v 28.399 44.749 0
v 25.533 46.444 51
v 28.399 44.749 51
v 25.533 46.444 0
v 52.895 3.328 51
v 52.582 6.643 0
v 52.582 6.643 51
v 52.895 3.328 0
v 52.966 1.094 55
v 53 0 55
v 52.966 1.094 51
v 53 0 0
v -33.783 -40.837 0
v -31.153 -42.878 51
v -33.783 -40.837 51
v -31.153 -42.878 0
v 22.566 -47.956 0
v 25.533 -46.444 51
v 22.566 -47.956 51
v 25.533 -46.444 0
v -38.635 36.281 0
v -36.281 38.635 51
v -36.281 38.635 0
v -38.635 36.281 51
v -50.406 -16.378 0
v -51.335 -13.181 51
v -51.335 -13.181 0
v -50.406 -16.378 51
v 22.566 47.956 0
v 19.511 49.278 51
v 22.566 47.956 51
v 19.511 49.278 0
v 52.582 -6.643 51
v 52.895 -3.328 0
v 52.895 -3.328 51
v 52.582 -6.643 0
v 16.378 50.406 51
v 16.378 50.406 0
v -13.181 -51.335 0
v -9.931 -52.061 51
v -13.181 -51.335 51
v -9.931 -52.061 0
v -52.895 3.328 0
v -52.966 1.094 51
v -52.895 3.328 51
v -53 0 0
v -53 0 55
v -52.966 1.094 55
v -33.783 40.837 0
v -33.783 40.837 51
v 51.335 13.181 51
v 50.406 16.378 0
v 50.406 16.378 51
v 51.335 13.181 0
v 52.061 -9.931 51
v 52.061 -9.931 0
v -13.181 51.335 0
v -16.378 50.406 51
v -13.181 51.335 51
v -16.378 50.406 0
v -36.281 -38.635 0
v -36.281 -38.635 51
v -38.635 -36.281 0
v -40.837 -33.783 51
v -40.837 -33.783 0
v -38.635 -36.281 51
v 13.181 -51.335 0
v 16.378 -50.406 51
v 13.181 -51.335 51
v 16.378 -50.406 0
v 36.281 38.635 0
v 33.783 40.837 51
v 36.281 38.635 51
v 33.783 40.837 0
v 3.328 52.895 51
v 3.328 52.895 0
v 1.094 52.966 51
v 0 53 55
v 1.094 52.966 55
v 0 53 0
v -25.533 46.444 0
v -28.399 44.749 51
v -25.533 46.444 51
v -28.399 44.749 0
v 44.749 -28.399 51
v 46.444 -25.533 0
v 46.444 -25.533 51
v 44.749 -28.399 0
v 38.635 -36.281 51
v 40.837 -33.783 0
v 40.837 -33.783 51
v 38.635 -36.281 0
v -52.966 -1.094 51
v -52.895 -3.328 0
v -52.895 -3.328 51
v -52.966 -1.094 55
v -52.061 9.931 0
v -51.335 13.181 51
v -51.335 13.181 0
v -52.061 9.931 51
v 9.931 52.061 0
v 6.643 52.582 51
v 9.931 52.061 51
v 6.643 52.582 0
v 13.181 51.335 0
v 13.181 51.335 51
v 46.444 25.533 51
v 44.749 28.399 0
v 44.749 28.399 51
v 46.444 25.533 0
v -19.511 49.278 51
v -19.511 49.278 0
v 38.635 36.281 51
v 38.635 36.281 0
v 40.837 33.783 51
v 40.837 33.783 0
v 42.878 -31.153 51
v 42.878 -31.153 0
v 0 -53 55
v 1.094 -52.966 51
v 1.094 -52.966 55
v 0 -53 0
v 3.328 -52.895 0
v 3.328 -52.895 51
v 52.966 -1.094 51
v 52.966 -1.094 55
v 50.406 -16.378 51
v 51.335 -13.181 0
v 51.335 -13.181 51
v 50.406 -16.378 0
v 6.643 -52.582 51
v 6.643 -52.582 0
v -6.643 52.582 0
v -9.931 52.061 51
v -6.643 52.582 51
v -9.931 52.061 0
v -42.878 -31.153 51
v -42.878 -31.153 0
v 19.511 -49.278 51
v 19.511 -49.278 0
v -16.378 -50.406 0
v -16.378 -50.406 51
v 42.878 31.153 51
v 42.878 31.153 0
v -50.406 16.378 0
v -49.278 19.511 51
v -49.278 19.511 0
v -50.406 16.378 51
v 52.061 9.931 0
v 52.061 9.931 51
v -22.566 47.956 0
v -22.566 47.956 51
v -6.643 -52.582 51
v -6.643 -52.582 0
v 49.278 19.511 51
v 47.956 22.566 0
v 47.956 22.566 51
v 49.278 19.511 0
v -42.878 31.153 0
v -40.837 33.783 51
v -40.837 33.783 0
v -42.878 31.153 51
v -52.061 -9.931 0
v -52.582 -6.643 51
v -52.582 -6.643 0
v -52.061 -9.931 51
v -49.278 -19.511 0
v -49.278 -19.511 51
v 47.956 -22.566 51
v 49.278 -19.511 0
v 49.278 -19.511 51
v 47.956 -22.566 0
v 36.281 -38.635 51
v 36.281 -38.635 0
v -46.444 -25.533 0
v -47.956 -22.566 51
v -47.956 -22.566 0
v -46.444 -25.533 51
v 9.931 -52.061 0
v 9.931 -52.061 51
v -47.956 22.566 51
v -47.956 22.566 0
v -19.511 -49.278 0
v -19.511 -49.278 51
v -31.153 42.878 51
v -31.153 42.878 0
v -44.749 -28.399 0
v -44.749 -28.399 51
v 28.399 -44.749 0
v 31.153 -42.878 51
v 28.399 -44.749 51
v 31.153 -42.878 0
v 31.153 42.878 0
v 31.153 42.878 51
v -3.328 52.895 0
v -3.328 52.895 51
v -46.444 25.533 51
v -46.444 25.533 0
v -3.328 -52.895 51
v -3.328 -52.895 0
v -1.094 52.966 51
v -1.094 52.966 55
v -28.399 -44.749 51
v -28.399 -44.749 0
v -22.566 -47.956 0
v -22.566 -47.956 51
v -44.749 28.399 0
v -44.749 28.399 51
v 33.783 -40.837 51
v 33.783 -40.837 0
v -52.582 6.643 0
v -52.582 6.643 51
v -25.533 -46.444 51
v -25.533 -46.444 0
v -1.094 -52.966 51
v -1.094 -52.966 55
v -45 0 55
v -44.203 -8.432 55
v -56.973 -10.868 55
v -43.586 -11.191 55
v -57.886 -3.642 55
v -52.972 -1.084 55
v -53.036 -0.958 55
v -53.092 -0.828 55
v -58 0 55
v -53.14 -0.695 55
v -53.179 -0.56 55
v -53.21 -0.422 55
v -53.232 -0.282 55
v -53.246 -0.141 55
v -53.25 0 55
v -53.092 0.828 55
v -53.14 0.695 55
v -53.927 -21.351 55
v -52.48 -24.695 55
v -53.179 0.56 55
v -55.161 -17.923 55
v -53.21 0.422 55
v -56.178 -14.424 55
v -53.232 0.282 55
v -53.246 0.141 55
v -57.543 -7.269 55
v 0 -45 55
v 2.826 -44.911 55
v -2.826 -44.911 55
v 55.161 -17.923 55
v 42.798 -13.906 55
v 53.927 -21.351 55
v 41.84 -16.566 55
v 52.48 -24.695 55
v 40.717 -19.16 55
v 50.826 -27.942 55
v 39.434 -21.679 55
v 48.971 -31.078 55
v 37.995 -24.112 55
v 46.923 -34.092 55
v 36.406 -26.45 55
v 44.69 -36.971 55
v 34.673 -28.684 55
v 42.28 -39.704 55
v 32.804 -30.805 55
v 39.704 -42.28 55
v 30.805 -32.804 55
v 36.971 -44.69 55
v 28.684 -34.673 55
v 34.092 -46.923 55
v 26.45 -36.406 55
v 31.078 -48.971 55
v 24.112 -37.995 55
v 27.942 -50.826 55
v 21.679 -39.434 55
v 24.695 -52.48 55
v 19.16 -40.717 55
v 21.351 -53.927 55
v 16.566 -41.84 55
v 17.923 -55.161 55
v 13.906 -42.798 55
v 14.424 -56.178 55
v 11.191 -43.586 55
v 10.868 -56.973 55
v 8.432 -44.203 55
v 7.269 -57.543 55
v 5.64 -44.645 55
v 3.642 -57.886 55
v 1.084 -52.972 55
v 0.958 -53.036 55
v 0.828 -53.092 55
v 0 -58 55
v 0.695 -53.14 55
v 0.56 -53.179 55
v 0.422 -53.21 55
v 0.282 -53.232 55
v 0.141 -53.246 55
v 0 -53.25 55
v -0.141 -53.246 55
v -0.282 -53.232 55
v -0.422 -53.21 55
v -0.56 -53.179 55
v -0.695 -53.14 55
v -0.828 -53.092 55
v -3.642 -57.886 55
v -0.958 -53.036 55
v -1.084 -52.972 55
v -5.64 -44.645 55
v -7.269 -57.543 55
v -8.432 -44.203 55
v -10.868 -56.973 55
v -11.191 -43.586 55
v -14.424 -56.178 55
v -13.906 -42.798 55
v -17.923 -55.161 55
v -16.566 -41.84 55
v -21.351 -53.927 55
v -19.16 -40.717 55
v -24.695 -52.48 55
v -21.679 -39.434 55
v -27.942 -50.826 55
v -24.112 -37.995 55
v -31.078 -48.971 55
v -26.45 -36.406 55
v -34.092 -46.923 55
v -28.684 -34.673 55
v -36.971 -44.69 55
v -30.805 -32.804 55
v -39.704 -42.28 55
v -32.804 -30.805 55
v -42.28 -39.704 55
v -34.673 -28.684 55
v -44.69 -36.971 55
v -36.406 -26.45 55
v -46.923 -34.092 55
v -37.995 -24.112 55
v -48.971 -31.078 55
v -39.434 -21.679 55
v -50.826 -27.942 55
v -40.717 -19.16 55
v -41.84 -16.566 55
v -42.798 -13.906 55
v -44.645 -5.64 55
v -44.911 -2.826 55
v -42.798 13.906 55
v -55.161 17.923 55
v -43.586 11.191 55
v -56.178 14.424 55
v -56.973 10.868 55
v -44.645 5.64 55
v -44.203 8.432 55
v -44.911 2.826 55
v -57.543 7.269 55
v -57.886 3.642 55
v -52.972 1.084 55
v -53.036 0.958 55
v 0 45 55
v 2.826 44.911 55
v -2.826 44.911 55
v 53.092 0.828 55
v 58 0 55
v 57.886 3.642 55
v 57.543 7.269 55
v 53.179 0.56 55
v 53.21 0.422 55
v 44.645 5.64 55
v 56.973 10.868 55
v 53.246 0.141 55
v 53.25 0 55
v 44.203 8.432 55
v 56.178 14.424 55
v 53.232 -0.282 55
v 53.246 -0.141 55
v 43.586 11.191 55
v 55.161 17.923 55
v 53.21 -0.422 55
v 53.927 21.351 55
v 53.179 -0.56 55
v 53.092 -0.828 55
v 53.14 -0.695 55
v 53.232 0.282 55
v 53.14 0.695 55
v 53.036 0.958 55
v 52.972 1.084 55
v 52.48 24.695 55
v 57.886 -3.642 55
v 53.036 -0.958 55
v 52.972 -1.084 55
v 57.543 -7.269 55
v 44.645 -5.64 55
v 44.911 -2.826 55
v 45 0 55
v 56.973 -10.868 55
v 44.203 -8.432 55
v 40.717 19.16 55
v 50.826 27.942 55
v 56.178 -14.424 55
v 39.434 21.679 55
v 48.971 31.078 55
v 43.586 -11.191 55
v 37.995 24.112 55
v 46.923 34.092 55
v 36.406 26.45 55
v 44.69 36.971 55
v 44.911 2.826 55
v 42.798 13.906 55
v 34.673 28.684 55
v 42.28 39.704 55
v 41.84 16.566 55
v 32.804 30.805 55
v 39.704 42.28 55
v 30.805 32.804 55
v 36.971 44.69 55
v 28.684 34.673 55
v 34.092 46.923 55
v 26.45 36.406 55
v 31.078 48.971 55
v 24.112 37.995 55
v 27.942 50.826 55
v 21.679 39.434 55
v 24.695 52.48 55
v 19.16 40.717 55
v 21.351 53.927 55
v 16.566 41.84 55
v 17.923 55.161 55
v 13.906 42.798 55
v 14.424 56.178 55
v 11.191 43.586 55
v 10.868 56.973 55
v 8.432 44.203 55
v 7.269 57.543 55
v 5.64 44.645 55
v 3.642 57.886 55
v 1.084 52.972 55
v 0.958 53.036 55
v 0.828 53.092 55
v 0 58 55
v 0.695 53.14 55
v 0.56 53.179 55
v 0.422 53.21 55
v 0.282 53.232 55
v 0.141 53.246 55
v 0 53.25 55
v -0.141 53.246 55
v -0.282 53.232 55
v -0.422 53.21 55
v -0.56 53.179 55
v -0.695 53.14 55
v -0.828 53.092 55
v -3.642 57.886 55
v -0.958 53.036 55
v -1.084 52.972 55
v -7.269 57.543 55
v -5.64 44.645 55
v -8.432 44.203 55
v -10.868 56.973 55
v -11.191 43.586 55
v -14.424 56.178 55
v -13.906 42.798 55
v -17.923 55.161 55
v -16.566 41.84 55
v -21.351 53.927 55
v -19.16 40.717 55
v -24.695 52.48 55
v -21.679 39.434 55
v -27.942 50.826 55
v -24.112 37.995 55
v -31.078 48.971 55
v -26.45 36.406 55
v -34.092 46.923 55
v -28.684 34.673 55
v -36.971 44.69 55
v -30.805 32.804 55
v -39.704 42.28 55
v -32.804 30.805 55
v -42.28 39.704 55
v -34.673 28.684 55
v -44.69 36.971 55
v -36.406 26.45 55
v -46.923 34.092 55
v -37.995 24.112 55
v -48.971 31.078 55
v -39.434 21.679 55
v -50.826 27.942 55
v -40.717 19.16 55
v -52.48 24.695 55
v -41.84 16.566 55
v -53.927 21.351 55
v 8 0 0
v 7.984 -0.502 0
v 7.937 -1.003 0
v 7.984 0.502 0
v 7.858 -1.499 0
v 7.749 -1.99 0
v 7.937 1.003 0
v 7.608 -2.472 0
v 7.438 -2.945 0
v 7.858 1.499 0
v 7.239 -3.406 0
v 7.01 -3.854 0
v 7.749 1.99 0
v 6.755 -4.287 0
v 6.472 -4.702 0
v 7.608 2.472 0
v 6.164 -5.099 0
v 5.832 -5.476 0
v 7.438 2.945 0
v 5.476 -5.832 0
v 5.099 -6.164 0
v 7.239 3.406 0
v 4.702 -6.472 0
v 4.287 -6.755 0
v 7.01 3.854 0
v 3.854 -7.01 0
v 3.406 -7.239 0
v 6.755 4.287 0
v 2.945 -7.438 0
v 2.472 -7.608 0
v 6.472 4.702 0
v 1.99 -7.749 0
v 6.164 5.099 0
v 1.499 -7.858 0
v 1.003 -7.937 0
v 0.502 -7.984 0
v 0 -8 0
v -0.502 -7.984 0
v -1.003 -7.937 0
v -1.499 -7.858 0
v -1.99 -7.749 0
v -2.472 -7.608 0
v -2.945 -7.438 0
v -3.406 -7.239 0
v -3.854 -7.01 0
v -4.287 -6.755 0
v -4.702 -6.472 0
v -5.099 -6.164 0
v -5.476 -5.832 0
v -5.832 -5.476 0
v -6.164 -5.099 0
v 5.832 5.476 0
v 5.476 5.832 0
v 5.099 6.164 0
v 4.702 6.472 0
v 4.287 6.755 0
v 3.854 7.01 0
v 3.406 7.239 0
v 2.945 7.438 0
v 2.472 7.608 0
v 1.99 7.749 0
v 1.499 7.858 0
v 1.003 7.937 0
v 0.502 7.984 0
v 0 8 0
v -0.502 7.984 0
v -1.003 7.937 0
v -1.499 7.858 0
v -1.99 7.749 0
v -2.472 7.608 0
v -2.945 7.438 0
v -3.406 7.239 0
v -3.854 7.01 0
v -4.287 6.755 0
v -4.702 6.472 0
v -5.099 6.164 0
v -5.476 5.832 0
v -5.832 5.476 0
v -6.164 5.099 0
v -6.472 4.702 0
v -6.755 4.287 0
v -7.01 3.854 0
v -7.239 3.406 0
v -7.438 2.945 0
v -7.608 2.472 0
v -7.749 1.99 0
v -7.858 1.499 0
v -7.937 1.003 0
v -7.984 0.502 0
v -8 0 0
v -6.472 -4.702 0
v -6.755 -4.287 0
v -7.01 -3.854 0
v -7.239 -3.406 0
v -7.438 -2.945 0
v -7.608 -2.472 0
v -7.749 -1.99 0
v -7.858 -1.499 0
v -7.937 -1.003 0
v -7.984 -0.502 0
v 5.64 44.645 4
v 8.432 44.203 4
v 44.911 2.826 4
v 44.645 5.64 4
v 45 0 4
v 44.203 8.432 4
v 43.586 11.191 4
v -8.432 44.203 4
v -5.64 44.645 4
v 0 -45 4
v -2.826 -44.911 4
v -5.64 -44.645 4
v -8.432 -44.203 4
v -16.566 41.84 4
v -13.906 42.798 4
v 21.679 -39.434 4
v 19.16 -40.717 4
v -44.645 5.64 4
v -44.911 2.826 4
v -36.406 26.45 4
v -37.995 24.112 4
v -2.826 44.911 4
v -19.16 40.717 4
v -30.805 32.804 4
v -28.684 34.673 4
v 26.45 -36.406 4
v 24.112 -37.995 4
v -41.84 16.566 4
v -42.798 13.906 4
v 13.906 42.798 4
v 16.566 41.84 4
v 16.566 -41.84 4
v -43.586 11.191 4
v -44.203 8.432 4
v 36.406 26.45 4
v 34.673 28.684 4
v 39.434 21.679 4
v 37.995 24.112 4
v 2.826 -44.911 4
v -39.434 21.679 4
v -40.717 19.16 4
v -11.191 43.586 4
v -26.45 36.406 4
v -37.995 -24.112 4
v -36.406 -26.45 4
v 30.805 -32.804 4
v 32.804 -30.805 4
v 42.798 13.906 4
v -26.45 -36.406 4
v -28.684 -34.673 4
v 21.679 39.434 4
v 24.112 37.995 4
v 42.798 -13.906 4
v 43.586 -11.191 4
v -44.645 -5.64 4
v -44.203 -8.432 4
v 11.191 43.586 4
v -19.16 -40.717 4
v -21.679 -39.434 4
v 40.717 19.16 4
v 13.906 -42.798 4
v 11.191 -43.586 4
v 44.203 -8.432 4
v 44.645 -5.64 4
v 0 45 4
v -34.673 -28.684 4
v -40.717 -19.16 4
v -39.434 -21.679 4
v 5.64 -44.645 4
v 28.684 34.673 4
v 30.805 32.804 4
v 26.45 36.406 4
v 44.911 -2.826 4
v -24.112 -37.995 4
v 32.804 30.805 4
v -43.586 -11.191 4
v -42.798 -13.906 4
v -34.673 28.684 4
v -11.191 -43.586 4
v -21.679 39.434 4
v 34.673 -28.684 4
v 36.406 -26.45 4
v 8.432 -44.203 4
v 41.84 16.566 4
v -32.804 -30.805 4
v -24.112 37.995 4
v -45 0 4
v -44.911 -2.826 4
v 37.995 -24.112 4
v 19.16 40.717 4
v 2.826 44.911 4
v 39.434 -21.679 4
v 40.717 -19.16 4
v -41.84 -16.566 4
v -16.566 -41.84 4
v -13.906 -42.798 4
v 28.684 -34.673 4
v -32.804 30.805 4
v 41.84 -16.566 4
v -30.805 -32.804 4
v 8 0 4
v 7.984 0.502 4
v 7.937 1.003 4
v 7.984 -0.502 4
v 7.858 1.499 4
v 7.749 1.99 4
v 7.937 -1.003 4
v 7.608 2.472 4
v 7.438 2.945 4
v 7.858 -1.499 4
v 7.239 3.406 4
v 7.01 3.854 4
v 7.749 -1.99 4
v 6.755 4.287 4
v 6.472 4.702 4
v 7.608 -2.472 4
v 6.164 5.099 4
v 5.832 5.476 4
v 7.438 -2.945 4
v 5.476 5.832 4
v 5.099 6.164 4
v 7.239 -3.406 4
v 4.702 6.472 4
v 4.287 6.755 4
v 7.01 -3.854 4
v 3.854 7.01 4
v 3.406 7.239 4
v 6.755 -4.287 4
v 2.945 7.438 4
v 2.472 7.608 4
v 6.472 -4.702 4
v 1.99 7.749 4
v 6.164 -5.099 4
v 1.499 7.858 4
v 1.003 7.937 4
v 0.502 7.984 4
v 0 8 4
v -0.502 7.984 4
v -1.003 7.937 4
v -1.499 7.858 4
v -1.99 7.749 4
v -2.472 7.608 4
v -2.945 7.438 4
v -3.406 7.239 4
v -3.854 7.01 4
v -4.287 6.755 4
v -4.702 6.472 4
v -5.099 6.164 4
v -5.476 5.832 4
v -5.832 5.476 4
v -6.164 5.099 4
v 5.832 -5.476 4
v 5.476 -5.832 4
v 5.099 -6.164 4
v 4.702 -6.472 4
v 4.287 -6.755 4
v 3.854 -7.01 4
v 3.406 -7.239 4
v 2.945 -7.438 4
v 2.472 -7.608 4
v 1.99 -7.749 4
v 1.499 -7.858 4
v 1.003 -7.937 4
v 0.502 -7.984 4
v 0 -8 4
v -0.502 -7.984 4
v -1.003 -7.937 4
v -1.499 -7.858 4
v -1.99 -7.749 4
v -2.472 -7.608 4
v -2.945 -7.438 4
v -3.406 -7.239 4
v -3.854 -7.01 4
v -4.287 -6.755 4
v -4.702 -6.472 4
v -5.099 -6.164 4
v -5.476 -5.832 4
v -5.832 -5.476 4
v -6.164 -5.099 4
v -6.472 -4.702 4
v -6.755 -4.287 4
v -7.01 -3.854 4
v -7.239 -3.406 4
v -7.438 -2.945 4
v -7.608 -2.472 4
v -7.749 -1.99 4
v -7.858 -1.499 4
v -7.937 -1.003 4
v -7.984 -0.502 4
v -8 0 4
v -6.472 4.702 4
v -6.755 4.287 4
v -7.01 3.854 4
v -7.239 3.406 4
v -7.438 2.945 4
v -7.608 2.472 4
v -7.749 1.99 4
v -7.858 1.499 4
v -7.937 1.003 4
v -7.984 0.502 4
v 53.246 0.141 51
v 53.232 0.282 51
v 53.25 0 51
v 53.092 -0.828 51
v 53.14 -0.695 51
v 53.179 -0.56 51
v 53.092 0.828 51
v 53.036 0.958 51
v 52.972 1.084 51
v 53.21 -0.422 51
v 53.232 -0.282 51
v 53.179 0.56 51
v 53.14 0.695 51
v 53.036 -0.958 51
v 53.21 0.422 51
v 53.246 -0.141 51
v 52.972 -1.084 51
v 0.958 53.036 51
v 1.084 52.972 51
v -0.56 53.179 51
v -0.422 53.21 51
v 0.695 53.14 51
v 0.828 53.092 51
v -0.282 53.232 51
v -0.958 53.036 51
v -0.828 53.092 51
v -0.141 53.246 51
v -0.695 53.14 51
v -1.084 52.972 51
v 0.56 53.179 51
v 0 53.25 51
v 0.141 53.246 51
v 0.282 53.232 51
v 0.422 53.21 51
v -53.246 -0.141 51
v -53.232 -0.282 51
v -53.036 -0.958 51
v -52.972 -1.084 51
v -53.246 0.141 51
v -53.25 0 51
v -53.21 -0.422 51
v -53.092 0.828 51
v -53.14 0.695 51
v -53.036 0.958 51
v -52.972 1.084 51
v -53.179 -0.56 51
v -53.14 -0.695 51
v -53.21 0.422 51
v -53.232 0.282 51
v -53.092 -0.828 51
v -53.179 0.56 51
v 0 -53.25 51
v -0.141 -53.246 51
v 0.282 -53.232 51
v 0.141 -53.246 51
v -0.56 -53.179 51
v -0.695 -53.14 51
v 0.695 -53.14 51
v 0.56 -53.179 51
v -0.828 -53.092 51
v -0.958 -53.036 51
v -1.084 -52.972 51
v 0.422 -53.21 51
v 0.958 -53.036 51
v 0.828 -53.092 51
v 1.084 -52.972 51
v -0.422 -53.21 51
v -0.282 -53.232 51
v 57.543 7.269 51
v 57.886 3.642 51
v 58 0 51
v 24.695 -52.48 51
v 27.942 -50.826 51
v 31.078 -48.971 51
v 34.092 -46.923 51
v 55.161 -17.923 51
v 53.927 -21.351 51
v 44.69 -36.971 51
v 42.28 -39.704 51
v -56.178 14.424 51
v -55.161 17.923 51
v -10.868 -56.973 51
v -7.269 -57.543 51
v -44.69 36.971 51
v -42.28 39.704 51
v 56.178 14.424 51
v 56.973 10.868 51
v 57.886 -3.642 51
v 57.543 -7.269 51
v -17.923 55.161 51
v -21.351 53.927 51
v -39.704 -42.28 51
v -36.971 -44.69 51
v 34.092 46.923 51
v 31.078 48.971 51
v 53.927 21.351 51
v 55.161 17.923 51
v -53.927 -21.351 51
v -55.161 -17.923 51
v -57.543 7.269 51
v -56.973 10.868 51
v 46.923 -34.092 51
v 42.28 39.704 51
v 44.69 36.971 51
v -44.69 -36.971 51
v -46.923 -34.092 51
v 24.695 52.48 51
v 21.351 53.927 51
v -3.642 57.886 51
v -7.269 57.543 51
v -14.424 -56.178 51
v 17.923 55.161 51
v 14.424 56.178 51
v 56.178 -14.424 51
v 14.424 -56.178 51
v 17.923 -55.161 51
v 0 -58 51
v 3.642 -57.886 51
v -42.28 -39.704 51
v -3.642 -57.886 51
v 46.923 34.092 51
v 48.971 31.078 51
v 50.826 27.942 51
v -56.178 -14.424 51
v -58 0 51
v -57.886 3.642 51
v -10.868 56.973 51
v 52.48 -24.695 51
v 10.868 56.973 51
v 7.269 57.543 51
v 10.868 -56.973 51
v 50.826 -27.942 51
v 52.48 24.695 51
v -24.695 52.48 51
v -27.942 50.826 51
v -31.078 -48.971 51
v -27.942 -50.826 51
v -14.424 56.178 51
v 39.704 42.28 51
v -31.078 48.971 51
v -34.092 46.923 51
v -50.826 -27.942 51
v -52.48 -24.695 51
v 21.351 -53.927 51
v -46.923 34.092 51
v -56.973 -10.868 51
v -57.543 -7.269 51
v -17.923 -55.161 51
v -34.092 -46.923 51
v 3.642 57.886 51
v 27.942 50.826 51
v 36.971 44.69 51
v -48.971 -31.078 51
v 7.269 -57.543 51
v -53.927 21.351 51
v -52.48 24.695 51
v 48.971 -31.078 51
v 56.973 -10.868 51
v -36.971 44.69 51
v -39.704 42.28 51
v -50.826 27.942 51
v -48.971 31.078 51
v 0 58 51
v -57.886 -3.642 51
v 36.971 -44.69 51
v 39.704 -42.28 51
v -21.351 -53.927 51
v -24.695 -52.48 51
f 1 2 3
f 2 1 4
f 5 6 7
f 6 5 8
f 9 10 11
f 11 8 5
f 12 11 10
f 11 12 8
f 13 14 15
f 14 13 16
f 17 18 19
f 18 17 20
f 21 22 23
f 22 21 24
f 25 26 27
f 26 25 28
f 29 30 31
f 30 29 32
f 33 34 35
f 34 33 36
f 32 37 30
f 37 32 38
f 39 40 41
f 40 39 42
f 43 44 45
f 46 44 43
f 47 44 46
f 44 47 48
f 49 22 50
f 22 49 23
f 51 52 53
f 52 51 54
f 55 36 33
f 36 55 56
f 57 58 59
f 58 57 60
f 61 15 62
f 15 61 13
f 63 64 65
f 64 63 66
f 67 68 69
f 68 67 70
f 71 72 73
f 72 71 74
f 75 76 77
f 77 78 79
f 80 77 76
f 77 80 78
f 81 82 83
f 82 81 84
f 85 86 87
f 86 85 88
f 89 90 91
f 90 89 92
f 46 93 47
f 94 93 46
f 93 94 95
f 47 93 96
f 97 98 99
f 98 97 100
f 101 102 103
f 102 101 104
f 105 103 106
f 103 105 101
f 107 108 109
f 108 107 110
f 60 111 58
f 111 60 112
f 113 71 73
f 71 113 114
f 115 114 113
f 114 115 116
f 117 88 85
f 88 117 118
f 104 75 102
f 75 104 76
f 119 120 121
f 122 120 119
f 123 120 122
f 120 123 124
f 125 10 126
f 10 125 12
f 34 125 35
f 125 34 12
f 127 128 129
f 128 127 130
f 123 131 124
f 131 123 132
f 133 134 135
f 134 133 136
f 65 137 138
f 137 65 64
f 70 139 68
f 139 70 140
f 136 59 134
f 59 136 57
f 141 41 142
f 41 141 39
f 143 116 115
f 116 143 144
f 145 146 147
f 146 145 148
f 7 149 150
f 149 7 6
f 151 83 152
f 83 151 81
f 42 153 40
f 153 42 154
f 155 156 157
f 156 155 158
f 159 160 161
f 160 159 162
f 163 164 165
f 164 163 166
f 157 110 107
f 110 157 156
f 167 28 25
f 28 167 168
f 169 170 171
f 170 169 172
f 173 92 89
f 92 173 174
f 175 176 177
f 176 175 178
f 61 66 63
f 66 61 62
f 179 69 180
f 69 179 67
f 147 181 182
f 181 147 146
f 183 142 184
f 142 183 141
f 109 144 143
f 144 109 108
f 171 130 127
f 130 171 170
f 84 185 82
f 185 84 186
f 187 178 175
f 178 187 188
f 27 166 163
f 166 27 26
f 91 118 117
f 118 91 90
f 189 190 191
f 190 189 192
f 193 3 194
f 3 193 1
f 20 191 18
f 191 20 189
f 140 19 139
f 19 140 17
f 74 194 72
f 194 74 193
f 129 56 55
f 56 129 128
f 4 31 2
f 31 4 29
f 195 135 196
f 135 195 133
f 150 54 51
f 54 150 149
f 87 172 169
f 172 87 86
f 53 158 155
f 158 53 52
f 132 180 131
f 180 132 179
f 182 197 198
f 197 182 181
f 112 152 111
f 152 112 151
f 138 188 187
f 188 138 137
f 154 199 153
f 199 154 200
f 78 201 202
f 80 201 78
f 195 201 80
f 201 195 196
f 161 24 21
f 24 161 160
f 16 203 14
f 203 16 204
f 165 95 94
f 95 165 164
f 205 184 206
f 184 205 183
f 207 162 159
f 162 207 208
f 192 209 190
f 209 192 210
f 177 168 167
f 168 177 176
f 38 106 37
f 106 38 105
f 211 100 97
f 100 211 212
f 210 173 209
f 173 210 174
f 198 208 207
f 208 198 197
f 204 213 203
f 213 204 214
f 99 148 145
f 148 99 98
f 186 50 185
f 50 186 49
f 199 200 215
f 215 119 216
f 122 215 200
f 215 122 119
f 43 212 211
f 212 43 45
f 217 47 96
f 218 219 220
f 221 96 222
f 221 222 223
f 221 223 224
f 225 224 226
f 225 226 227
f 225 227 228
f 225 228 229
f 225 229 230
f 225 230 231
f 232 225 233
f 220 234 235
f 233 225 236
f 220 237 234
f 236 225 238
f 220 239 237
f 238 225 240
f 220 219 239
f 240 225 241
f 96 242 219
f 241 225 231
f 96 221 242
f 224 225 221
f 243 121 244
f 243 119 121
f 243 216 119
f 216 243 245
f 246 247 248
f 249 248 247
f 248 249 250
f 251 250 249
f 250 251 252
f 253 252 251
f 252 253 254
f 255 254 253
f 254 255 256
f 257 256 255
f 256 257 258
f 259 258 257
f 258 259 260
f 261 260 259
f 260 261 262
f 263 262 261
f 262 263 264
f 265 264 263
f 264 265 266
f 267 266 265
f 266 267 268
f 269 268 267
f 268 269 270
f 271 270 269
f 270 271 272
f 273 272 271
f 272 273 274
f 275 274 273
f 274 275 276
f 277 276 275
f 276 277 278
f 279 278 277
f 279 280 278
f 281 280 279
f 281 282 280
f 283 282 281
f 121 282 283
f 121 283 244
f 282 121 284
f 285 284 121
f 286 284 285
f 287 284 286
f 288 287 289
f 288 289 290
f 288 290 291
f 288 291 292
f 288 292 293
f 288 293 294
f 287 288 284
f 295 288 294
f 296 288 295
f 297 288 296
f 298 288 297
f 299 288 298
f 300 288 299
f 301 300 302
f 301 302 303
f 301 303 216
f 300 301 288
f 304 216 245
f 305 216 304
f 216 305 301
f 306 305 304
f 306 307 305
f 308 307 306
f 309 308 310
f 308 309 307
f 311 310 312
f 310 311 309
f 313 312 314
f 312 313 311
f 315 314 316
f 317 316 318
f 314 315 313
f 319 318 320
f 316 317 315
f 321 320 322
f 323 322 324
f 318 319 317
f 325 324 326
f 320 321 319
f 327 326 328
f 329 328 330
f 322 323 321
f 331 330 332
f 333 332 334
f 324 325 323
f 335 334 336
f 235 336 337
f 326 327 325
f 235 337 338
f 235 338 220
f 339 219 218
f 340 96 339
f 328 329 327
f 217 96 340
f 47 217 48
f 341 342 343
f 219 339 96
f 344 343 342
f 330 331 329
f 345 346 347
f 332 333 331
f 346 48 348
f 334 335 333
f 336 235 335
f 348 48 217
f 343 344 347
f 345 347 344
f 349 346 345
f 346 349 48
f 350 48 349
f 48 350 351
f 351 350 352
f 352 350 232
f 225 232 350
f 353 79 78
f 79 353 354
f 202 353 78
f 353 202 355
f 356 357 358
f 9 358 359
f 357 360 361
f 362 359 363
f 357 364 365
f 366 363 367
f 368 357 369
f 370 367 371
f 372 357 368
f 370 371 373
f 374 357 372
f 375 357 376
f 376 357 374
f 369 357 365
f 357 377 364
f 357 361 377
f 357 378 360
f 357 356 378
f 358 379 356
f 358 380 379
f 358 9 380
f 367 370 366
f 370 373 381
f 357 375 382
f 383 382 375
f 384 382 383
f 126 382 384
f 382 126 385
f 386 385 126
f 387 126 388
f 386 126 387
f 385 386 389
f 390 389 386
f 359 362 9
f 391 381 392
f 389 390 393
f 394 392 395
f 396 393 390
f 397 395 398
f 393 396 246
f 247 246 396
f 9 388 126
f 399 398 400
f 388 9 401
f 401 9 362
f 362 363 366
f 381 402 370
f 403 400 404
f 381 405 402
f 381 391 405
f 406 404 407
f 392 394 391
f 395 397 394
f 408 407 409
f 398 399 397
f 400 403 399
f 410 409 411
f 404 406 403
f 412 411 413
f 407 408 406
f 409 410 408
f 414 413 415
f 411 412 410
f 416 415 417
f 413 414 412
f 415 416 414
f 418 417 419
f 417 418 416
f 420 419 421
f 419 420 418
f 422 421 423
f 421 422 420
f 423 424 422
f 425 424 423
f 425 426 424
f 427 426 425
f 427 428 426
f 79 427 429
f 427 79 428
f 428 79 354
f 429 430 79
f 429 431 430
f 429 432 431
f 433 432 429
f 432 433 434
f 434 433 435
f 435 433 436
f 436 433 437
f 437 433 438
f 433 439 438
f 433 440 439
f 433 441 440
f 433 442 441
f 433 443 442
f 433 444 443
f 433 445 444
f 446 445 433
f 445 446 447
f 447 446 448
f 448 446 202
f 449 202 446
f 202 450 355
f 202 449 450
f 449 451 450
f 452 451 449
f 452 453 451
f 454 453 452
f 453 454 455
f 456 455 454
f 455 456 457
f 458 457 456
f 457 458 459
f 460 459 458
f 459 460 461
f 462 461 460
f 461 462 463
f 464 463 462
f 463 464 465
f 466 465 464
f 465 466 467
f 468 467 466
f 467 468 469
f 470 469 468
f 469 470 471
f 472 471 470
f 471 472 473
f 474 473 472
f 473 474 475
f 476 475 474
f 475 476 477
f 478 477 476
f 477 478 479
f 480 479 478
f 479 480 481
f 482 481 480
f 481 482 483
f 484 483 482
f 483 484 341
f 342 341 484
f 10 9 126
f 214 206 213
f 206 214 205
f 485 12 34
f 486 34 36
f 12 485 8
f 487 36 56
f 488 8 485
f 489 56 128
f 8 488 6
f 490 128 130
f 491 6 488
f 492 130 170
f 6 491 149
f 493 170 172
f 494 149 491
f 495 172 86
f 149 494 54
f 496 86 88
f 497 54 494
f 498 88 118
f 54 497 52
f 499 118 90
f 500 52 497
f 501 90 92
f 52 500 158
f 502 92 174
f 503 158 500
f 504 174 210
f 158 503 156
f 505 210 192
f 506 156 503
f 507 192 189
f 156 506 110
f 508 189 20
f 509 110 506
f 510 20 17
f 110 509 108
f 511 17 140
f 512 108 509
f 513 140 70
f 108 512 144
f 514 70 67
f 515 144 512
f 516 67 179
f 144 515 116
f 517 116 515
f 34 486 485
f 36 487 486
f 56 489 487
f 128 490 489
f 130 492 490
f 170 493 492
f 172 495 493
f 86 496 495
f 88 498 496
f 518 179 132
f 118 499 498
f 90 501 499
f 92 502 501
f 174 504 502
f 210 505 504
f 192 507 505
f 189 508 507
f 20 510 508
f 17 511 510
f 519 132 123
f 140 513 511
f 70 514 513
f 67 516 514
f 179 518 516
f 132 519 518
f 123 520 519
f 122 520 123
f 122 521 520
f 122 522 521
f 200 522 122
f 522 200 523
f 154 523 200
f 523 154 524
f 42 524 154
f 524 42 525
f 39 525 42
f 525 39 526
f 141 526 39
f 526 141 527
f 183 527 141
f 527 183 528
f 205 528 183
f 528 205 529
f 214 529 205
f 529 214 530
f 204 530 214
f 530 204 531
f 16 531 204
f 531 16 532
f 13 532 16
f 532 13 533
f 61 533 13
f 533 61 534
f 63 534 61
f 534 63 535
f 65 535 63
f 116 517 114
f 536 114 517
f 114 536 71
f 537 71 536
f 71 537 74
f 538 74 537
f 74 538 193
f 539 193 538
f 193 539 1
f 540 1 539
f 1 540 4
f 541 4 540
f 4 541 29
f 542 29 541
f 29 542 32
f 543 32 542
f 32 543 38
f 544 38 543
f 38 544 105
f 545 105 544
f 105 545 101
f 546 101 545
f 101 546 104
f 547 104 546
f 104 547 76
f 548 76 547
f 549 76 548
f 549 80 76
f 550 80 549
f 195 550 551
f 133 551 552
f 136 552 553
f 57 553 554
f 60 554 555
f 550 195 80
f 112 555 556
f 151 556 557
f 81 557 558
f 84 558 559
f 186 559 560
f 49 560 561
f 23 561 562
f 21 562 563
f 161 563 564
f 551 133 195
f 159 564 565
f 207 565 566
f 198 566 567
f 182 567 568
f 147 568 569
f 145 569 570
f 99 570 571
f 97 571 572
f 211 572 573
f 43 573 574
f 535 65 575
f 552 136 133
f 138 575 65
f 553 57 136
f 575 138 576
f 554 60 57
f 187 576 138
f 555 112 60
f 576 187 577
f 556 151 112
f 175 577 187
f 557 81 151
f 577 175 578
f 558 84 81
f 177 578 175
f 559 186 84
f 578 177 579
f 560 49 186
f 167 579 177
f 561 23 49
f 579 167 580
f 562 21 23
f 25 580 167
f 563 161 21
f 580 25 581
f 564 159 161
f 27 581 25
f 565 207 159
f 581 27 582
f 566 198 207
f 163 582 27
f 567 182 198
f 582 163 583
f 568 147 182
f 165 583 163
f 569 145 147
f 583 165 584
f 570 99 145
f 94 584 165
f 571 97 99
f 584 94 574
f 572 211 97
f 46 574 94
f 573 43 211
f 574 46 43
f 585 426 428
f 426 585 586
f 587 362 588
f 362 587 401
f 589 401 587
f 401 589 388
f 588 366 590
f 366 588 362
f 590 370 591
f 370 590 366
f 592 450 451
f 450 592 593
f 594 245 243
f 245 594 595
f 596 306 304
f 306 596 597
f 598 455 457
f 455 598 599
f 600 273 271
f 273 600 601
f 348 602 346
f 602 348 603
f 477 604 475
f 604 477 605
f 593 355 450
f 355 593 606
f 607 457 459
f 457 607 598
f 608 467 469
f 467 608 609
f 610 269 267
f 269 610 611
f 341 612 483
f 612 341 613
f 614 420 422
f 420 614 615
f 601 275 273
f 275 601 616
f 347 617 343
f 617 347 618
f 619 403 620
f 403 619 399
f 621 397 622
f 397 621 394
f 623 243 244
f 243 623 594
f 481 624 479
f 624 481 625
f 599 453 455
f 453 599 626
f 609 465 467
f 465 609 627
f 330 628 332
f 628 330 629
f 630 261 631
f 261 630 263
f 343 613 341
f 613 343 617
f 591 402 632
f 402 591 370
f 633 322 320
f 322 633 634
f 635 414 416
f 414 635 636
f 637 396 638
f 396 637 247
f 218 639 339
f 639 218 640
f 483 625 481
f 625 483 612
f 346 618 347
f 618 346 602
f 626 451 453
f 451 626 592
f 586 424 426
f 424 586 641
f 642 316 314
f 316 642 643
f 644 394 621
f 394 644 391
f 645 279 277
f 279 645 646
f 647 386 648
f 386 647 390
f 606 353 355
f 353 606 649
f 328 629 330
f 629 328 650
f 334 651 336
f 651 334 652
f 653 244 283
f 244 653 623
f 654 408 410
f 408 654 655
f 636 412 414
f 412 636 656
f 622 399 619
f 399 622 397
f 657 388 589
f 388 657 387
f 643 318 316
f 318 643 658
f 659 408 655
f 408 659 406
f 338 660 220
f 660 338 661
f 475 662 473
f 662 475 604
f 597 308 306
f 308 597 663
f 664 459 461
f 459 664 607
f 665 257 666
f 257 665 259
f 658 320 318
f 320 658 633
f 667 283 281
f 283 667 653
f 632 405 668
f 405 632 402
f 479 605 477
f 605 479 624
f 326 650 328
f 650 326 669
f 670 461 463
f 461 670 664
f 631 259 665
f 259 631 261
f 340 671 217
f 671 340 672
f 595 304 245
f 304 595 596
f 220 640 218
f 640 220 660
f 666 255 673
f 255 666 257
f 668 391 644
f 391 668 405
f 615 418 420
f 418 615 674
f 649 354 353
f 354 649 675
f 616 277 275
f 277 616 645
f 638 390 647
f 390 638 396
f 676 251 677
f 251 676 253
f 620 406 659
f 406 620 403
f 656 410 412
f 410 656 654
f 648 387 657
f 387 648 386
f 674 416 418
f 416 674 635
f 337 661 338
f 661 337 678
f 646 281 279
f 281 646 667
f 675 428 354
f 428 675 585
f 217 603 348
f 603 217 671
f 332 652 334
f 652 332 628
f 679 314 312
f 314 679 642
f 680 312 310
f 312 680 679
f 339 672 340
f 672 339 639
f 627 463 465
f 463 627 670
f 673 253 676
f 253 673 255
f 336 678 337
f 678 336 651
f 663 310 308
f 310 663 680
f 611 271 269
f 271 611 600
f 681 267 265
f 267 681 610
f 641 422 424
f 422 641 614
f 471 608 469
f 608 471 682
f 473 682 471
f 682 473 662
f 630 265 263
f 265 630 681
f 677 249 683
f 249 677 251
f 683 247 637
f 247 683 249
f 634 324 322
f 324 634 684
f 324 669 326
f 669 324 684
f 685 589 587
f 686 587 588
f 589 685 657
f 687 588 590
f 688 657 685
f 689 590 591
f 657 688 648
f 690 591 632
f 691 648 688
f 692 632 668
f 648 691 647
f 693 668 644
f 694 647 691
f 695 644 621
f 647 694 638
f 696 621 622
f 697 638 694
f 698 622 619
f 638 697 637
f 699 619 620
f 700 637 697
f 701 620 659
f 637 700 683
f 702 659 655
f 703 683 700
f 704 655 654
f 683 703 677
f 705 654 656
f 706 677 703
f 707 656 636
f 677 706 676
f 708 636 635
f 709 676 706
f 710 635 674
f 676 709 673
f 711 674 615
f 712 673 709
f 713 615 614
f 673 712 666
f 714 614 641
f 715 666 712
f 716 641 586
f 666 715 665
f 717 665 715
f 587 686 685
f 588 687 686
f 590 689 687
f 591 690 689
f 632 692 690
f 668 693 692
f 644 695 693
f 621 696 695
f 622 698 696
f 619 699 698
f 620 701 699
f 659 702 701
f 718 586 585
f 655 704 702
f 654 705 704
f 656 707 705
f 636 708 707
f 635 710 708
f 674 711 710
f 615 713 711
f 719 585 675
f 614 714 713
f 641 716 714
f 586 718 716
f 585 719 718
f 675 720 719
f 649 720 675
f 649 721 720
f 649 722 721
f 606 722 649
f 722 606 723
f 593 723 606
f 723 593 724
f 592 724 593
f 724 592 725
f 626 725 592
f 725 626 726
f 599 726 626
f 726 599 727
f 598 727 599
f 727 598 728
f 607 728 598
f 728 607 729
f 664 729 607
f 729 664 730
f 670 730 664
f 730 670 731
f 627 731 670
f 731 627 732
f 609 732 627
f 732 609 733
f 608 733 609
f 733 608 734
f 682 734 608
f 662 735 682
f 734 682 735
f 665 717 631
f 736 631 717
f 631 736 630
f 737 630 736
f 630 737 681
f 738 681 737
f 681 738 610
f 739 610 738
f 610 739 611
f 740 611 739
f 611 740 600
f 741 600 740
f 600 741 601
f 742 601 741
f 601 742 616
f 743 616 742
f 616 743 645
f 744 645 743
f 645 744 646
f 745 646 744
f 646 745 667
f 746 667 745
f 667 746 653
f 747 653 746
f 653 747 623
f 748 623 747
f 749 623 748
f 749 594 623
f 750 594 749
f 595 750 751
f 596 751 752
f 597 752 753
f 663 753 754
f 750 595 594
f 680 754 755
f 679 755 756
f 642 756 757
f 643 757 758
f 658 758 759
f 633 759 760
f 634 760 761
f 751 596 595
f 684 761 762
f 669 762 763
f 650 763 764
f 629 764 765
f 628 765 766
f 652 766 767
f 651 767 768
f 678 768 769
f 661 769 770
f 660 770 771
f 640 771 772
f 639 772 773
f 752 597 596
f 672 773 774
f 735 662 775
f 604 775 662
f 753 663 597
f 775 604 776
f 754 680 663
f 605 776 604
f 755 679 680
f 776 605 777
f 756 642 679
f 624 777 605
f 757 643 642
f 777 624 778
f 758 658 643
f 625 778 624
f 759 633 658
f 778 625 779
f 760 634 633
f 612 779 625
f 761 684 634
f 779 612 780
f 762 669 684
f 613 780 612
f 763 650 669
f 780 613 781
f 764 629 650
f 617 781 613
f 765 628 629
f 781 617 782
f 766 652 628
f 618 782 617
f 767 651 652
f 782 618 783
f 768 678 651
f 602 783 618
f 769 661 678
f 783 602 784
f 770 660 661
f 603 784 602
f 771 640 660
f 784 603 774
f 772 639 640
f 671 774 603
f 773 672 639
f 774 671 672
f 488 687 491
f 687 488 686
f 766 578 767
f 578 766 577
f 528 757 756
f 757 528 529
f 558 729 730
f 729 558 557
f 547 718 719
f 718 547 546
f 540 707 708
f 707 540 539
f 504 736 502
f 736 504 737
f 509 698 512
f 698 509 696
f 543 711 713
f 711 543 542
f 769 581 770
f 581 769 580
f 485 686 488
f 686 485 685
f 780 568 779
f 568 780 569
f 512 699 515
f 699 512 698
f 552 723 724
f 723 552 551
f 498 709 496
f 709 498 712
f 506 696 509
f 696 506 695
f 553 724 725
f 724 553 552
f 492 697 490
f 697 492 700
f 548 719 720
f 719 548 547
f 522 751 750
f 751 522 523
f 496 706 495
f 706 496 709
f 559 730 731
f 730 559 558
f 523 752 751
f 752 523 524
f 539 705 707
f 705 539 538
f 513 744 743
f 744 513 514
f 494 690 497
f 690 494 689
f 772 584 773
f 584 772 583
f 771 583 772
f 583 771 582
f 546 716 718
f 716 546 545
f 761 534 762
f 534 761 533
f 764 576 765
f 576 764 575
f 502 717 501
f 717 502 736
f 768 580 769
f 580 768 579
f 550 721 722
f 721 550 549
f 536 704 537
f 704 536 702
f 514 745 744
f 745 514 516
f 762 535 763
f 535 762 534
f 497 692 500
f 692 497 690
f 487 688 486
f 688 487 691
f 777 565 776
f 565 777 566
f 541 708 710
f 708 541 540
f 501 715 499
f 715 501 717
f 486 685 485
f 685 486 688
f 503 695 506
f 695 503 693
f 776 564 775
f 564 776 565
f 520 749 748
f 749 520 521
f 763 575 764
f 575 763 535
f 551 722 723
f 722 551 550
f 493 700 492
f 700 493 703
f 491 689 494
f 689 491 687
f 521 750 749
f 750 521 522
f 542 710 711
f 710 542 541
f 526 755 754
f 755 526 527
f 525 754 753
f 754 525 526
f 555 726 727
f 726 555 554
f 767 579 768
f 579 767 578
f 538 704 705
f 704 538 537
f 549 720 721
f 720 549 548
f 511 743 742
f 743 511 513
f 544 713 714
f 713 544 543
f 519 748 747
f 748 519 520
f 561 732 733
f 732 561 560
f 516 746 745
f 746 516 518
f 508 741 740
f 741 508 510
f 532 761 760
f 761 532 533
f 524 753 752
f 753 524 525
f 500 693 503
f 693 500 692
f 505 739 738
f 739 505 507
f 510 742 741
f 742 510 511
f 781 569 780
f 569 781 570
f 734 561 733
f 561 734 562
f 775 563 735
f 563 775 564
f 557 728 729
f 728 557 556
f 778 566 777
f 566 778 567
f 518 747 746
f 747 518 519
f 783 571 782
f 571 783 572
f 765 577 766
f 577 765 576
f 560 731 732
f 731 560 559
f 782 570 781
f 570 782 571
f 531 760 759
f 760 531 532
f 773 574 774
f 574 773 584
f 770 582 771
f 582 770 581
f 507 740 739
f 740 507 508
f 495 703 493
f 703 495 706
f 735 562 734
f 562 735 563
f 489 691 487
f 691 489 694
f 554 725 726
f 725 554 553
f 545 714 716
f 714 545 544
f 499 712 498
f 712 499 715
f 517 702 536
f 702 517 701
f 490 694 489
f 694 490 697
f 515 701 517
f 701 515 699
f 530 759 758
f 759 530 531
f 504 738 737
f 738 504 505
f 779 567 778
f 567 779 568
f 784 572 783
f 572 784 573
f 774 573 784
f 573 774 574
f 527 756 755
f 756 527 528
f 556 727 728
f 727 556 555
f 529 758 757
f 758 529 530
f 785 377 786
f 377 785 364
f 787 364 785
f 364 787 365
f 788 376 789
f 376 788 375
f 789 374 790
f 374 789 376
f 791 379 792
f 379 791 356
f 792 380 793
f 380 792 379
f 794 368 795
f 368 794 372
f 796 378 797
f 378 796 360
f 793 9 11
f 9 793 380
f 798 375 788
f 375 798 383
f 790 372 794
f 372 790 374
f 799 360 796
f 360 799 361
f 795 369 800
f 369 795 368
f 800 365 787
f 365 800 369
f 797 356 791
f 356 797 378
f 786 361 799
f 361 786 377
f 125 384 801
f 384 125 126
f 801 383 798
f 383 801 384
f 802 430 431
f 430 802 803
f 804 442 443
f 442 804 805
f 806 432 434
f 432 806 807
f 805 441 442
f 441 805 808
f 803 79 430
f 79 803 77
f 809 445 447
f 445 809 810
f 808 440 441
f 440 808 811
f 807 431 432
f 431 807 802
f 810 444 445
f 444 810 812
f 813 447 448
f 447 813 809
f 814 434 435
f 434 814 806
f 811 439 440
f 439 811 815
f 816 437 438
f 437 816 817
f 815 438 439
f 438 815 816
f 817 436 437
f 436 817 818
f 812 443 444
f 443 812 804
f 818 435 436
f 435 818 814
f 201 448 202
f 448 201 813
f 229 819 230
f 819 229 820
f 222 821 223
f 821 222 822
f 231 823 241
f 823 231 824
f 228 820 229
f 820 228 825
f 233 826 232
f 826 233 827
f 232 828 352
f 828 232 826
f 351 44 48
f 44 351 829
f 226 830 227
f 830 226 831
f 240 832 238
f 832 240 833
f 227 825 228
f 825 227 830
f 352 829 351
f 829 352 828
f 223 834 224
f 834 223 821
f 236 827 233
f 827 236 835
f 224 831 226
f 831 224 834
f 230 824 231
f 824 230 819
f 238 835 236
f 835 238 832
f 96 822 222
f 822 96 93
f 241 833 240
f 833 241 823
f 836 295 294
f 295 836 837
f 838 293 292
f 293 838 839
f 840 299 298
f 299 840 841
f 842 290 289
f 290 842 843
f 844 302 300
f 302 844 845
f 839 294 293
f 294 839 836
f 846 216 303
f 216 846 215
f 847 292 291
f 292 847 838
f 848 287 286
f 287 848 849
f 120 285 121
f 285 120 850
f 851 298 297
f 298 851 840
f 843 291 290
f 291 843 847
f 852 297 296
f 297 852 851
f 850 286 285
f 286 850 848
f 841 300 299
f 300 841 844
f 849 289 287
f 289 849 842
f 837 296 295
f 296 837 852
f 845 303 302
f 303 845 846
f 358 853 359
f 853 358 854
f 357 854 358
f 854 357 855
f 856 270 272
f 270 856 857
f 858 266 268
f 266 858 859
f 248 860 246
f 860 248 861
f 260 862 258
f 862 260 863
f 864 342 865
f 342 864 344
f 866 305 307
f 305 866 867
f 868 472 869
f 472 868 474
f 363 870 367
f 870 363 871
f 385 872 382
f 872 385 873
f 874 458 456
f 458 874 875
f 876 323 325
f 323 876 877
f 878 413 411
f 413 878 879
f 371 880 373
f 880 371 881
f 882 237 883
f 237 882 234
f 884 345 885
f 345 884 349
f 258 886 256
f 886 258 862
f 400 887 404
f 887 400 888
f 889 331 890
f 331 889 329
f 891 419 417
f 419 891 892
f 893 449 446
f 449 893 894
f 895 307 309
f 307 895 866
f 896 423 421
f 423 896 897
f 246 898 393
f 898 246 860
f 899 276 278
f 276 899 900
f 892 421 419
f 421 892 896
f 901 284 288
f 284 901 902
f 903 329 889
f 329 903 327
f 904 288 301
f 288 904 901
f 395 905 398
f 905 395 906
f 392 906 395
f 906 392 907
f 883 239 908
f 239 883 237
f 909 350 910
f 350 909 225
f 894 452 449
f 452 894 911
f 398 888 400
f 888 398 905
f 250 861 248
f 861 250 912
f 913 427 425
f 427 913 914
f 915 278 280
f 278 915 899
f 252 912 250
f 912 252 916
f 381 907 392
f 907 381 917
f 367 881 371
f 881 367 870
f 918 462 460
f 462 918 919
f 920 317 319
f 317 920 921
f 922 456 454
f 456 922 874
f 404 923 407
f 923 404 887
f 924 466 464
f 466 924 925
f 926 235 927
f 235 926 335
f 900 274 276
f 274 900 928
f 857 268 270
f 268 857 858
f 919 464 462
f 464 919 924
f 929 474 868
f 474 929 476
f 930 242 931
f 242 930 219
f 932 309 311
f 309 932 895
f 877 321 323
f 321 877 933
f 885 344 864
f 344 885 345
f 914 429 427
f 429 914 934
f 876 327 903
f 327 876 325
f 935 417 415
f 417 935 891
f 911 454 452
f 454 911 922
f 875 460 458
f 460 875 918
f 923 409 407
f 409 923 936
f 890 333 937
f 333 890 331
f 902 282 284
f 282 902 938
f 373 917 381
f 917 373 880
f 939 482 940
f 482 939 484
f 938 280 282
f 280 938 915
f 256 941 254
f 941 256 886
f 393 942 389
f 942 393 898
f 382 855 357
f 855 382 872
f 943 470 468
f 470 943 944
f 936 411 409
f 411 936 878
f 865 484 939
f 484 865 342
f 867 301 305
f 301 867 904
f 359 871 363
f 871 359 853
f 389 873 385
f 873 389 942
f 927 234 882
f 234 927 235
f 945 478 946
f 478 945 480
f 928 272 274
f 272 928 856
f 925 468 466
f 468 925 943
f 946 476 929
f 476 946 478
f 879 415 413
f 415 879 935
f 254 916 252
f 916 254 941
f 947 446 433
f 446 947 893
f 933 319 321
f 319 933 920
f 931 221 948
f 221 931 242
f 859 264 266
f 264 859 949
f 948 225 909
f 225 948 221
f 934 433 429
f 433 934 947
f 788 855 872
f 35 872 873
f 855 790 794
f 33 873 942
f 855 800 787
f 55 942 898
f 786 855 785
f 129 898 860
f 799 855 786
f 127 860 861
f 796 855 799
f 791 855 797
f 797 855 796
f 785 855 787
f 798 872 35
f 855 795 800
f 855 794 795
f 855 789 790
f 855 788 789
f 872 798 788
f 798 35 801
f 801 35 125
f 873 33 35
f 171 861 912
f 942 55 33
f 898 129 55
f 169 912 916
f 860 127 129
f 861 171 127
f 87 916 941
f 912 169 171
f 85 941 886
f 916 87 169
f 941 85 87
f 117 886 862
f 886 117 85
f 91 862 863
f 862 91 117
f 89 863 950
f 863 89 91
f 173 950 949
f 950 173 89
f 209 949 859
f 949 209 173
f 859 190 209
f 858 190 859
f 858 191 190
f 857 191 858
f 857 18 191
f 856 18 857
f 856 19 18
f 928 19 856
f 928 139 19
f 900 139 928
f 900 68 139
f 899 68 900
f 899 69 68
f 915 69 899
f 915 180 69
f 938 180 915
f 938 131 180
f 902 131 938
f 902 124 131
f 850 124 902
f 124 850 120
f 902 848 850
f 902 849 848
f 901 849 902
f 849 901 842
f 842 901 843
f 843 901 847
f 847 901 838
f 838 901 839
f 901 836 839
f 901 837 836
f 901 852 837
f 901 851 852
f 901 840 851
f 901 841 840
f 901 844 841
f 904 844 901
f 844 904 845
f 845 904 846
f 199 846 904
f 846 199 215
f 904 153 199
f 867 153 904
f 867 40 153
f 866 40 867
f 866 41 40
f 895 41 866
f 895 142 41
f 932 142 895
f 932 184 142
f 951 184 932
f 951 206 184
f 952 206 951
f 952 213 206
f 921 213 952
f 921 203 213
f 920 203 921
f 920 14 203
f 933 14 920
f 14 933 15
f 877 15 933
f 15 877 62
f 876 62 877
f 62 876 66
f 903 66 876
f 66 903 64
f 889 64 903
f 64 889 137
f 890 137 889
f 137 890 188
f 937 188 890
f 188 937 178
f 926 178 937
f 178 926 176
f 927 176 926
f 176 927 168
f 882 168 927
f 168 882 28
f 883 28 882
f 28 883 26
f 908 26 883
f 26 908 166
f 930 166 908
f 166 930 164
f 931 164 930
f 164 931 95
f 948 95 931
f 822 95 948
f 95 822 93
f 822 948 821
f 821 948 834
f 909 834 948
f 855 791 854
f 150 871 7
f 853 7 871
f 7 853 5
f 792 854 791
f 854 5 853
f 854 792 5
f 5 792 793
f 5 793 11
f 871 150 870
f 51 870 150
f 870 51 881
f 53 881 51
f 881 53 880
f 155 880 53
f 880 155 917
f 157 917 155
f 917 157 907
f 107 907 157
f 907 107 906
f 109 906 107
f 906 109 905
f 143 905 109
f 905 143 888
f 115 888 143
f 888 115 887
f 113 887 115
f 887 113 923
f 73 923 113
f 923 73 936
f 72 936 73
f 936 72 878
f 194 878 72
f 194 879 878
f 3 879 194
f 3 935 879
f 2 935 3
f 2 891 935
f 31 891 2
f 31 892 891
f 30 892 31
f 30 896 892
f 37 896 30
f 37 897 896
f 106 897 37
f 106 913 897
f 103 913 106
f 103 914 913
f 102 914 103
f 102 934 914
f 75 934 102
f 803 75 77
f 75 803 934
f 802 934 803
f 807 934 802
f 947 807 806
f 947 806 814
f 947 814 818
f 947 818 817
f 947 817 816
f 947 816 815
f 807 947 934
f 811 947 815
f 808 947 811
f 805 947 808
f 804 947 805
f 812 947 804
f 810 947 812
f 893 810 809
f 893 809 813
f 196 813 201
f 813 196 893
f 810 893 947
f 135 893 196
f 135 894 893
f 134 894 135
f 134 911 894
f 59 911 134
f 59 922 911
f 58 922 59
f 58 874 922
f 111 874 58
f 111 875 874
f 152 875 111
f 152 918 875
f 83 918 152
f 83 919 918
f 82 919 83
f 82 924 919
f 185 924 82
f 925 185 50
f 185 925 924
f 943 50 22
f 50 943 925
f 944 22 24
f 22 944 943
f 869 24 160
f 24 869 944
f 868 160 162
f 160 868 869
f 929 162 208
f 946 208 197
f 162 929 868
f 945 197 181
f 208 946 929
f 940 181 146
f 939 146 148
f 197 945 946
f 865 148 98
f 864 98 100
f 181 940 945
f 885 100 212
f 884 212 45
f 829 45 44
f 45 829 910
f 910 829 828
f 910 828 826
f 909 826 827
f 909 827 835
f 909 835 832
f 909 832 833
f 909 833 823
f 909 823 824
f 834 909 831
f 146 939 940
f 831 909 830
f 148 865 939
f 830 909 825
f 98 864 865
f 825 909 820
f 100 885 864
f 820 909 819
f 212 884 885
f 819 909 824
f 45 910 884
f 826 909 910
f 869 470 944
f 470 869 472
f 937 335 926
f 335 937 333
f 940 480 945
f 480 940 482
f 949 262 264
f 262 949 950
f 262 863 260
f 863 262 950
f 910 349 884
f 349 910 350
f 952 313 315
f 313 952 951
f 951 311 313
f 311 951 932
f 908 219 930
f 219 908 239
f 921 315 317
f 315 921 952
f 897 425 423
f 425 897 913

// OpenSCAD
// ====================================================================================
// REVOLUTIONARY TECHNOLOGY COMPANY & UNIVERSITY OF WASHINGTON DEPARTMENT OF PHYSICS
// Subsystem: bose_acoustic_enclosures.scad (Bose High-Efficiency Alert Matrix)
// Core Partner: Bose Automotive Custom Flight & Performance Acoustics Division
// Center Origin (0,0,0) = Geometric Center of the Transducer Mounting Flange Face
// ====================================================================================

$fn = 100; // CNC injection-tooling path optimization resolution

// --- Bose Mechanical Parameter Constants (mm) ---
inch_to_mm          = 25.4;
transducer_core_dia = 90.00;           // Tuned Bose 3.5-inch Neodymium midrange array
enclosure_depth     = 55.00;           // Optimized rear acoustic air-compression cavity
mount_flange_thick  = 4.00;            // Vibration-resistant rigid mounting collar
fastener_circle_dia = 102.00;          // Radial bolt circle diameter for speaker tabs

module bose_dash_pod() {
    // Rigid protective acoustic housing block designed to press-fit into the OtterBox dash beam
    color("DimGrey") {
        difference() {
            // Main cylindrical acoustic speaker housing cup
            cylinder(d=transducer_core_dia + 16, h=enclosure_depth, center=false);
            
            // Tuned internal air chamber volume box (Eliminates acoustic cancelation waves)
            translate([0, 0, mount_flange_thick])
                cylinder(d=transducer_core_dia, h=enclosure_depth);
                
            // Rear wire pass-through channel for the shielded low-voltage audio trunk
            translate([0, 0, -1])
                cylinder(d=16.0, h=mount_flange_thick + 2);
        }
    }
}

module integrated_mounting_flange() {
    // Horizontal mounting collar ear layout with pre-cut structural fastener through-holes
    color("Silver") {
        difference() {
            // Flat outer mounting rim ring ring
            translate([0, 0, enclosure_depth - mount_flange_thick])
                cylinder(d=fastener_circle_dia + 14, h=mount_flange_thick);
            
            // Clear inner bore matching the speaker cone swing throat
            translate([0, 0, enclosure_depth - mount_flange_thick - 1])
                cylinder(d=transducer_core_dia + 2, h=mount_flange_thick + 2);
            
            // 4-Point Symmetric Fastener Bolt Hole Layout (M4 hardware studs)
            for (i = [0 : 3]) {
                angle = i * 90;
                translate([cos(angle) * (fastener_circle_dia / 2), sin(angle) * (fastener_circle_dia / 2), enclosure_depth - mount_flange_thick - 1])
                    cylinder(d=4.5, h=mount_flange_thick + 2);
            }
        }
    }
}

// --- Composite Acoustic Module Instantiation ---
union() {
    bose_dash_pod();
    integrated_mounting_flange();
}
